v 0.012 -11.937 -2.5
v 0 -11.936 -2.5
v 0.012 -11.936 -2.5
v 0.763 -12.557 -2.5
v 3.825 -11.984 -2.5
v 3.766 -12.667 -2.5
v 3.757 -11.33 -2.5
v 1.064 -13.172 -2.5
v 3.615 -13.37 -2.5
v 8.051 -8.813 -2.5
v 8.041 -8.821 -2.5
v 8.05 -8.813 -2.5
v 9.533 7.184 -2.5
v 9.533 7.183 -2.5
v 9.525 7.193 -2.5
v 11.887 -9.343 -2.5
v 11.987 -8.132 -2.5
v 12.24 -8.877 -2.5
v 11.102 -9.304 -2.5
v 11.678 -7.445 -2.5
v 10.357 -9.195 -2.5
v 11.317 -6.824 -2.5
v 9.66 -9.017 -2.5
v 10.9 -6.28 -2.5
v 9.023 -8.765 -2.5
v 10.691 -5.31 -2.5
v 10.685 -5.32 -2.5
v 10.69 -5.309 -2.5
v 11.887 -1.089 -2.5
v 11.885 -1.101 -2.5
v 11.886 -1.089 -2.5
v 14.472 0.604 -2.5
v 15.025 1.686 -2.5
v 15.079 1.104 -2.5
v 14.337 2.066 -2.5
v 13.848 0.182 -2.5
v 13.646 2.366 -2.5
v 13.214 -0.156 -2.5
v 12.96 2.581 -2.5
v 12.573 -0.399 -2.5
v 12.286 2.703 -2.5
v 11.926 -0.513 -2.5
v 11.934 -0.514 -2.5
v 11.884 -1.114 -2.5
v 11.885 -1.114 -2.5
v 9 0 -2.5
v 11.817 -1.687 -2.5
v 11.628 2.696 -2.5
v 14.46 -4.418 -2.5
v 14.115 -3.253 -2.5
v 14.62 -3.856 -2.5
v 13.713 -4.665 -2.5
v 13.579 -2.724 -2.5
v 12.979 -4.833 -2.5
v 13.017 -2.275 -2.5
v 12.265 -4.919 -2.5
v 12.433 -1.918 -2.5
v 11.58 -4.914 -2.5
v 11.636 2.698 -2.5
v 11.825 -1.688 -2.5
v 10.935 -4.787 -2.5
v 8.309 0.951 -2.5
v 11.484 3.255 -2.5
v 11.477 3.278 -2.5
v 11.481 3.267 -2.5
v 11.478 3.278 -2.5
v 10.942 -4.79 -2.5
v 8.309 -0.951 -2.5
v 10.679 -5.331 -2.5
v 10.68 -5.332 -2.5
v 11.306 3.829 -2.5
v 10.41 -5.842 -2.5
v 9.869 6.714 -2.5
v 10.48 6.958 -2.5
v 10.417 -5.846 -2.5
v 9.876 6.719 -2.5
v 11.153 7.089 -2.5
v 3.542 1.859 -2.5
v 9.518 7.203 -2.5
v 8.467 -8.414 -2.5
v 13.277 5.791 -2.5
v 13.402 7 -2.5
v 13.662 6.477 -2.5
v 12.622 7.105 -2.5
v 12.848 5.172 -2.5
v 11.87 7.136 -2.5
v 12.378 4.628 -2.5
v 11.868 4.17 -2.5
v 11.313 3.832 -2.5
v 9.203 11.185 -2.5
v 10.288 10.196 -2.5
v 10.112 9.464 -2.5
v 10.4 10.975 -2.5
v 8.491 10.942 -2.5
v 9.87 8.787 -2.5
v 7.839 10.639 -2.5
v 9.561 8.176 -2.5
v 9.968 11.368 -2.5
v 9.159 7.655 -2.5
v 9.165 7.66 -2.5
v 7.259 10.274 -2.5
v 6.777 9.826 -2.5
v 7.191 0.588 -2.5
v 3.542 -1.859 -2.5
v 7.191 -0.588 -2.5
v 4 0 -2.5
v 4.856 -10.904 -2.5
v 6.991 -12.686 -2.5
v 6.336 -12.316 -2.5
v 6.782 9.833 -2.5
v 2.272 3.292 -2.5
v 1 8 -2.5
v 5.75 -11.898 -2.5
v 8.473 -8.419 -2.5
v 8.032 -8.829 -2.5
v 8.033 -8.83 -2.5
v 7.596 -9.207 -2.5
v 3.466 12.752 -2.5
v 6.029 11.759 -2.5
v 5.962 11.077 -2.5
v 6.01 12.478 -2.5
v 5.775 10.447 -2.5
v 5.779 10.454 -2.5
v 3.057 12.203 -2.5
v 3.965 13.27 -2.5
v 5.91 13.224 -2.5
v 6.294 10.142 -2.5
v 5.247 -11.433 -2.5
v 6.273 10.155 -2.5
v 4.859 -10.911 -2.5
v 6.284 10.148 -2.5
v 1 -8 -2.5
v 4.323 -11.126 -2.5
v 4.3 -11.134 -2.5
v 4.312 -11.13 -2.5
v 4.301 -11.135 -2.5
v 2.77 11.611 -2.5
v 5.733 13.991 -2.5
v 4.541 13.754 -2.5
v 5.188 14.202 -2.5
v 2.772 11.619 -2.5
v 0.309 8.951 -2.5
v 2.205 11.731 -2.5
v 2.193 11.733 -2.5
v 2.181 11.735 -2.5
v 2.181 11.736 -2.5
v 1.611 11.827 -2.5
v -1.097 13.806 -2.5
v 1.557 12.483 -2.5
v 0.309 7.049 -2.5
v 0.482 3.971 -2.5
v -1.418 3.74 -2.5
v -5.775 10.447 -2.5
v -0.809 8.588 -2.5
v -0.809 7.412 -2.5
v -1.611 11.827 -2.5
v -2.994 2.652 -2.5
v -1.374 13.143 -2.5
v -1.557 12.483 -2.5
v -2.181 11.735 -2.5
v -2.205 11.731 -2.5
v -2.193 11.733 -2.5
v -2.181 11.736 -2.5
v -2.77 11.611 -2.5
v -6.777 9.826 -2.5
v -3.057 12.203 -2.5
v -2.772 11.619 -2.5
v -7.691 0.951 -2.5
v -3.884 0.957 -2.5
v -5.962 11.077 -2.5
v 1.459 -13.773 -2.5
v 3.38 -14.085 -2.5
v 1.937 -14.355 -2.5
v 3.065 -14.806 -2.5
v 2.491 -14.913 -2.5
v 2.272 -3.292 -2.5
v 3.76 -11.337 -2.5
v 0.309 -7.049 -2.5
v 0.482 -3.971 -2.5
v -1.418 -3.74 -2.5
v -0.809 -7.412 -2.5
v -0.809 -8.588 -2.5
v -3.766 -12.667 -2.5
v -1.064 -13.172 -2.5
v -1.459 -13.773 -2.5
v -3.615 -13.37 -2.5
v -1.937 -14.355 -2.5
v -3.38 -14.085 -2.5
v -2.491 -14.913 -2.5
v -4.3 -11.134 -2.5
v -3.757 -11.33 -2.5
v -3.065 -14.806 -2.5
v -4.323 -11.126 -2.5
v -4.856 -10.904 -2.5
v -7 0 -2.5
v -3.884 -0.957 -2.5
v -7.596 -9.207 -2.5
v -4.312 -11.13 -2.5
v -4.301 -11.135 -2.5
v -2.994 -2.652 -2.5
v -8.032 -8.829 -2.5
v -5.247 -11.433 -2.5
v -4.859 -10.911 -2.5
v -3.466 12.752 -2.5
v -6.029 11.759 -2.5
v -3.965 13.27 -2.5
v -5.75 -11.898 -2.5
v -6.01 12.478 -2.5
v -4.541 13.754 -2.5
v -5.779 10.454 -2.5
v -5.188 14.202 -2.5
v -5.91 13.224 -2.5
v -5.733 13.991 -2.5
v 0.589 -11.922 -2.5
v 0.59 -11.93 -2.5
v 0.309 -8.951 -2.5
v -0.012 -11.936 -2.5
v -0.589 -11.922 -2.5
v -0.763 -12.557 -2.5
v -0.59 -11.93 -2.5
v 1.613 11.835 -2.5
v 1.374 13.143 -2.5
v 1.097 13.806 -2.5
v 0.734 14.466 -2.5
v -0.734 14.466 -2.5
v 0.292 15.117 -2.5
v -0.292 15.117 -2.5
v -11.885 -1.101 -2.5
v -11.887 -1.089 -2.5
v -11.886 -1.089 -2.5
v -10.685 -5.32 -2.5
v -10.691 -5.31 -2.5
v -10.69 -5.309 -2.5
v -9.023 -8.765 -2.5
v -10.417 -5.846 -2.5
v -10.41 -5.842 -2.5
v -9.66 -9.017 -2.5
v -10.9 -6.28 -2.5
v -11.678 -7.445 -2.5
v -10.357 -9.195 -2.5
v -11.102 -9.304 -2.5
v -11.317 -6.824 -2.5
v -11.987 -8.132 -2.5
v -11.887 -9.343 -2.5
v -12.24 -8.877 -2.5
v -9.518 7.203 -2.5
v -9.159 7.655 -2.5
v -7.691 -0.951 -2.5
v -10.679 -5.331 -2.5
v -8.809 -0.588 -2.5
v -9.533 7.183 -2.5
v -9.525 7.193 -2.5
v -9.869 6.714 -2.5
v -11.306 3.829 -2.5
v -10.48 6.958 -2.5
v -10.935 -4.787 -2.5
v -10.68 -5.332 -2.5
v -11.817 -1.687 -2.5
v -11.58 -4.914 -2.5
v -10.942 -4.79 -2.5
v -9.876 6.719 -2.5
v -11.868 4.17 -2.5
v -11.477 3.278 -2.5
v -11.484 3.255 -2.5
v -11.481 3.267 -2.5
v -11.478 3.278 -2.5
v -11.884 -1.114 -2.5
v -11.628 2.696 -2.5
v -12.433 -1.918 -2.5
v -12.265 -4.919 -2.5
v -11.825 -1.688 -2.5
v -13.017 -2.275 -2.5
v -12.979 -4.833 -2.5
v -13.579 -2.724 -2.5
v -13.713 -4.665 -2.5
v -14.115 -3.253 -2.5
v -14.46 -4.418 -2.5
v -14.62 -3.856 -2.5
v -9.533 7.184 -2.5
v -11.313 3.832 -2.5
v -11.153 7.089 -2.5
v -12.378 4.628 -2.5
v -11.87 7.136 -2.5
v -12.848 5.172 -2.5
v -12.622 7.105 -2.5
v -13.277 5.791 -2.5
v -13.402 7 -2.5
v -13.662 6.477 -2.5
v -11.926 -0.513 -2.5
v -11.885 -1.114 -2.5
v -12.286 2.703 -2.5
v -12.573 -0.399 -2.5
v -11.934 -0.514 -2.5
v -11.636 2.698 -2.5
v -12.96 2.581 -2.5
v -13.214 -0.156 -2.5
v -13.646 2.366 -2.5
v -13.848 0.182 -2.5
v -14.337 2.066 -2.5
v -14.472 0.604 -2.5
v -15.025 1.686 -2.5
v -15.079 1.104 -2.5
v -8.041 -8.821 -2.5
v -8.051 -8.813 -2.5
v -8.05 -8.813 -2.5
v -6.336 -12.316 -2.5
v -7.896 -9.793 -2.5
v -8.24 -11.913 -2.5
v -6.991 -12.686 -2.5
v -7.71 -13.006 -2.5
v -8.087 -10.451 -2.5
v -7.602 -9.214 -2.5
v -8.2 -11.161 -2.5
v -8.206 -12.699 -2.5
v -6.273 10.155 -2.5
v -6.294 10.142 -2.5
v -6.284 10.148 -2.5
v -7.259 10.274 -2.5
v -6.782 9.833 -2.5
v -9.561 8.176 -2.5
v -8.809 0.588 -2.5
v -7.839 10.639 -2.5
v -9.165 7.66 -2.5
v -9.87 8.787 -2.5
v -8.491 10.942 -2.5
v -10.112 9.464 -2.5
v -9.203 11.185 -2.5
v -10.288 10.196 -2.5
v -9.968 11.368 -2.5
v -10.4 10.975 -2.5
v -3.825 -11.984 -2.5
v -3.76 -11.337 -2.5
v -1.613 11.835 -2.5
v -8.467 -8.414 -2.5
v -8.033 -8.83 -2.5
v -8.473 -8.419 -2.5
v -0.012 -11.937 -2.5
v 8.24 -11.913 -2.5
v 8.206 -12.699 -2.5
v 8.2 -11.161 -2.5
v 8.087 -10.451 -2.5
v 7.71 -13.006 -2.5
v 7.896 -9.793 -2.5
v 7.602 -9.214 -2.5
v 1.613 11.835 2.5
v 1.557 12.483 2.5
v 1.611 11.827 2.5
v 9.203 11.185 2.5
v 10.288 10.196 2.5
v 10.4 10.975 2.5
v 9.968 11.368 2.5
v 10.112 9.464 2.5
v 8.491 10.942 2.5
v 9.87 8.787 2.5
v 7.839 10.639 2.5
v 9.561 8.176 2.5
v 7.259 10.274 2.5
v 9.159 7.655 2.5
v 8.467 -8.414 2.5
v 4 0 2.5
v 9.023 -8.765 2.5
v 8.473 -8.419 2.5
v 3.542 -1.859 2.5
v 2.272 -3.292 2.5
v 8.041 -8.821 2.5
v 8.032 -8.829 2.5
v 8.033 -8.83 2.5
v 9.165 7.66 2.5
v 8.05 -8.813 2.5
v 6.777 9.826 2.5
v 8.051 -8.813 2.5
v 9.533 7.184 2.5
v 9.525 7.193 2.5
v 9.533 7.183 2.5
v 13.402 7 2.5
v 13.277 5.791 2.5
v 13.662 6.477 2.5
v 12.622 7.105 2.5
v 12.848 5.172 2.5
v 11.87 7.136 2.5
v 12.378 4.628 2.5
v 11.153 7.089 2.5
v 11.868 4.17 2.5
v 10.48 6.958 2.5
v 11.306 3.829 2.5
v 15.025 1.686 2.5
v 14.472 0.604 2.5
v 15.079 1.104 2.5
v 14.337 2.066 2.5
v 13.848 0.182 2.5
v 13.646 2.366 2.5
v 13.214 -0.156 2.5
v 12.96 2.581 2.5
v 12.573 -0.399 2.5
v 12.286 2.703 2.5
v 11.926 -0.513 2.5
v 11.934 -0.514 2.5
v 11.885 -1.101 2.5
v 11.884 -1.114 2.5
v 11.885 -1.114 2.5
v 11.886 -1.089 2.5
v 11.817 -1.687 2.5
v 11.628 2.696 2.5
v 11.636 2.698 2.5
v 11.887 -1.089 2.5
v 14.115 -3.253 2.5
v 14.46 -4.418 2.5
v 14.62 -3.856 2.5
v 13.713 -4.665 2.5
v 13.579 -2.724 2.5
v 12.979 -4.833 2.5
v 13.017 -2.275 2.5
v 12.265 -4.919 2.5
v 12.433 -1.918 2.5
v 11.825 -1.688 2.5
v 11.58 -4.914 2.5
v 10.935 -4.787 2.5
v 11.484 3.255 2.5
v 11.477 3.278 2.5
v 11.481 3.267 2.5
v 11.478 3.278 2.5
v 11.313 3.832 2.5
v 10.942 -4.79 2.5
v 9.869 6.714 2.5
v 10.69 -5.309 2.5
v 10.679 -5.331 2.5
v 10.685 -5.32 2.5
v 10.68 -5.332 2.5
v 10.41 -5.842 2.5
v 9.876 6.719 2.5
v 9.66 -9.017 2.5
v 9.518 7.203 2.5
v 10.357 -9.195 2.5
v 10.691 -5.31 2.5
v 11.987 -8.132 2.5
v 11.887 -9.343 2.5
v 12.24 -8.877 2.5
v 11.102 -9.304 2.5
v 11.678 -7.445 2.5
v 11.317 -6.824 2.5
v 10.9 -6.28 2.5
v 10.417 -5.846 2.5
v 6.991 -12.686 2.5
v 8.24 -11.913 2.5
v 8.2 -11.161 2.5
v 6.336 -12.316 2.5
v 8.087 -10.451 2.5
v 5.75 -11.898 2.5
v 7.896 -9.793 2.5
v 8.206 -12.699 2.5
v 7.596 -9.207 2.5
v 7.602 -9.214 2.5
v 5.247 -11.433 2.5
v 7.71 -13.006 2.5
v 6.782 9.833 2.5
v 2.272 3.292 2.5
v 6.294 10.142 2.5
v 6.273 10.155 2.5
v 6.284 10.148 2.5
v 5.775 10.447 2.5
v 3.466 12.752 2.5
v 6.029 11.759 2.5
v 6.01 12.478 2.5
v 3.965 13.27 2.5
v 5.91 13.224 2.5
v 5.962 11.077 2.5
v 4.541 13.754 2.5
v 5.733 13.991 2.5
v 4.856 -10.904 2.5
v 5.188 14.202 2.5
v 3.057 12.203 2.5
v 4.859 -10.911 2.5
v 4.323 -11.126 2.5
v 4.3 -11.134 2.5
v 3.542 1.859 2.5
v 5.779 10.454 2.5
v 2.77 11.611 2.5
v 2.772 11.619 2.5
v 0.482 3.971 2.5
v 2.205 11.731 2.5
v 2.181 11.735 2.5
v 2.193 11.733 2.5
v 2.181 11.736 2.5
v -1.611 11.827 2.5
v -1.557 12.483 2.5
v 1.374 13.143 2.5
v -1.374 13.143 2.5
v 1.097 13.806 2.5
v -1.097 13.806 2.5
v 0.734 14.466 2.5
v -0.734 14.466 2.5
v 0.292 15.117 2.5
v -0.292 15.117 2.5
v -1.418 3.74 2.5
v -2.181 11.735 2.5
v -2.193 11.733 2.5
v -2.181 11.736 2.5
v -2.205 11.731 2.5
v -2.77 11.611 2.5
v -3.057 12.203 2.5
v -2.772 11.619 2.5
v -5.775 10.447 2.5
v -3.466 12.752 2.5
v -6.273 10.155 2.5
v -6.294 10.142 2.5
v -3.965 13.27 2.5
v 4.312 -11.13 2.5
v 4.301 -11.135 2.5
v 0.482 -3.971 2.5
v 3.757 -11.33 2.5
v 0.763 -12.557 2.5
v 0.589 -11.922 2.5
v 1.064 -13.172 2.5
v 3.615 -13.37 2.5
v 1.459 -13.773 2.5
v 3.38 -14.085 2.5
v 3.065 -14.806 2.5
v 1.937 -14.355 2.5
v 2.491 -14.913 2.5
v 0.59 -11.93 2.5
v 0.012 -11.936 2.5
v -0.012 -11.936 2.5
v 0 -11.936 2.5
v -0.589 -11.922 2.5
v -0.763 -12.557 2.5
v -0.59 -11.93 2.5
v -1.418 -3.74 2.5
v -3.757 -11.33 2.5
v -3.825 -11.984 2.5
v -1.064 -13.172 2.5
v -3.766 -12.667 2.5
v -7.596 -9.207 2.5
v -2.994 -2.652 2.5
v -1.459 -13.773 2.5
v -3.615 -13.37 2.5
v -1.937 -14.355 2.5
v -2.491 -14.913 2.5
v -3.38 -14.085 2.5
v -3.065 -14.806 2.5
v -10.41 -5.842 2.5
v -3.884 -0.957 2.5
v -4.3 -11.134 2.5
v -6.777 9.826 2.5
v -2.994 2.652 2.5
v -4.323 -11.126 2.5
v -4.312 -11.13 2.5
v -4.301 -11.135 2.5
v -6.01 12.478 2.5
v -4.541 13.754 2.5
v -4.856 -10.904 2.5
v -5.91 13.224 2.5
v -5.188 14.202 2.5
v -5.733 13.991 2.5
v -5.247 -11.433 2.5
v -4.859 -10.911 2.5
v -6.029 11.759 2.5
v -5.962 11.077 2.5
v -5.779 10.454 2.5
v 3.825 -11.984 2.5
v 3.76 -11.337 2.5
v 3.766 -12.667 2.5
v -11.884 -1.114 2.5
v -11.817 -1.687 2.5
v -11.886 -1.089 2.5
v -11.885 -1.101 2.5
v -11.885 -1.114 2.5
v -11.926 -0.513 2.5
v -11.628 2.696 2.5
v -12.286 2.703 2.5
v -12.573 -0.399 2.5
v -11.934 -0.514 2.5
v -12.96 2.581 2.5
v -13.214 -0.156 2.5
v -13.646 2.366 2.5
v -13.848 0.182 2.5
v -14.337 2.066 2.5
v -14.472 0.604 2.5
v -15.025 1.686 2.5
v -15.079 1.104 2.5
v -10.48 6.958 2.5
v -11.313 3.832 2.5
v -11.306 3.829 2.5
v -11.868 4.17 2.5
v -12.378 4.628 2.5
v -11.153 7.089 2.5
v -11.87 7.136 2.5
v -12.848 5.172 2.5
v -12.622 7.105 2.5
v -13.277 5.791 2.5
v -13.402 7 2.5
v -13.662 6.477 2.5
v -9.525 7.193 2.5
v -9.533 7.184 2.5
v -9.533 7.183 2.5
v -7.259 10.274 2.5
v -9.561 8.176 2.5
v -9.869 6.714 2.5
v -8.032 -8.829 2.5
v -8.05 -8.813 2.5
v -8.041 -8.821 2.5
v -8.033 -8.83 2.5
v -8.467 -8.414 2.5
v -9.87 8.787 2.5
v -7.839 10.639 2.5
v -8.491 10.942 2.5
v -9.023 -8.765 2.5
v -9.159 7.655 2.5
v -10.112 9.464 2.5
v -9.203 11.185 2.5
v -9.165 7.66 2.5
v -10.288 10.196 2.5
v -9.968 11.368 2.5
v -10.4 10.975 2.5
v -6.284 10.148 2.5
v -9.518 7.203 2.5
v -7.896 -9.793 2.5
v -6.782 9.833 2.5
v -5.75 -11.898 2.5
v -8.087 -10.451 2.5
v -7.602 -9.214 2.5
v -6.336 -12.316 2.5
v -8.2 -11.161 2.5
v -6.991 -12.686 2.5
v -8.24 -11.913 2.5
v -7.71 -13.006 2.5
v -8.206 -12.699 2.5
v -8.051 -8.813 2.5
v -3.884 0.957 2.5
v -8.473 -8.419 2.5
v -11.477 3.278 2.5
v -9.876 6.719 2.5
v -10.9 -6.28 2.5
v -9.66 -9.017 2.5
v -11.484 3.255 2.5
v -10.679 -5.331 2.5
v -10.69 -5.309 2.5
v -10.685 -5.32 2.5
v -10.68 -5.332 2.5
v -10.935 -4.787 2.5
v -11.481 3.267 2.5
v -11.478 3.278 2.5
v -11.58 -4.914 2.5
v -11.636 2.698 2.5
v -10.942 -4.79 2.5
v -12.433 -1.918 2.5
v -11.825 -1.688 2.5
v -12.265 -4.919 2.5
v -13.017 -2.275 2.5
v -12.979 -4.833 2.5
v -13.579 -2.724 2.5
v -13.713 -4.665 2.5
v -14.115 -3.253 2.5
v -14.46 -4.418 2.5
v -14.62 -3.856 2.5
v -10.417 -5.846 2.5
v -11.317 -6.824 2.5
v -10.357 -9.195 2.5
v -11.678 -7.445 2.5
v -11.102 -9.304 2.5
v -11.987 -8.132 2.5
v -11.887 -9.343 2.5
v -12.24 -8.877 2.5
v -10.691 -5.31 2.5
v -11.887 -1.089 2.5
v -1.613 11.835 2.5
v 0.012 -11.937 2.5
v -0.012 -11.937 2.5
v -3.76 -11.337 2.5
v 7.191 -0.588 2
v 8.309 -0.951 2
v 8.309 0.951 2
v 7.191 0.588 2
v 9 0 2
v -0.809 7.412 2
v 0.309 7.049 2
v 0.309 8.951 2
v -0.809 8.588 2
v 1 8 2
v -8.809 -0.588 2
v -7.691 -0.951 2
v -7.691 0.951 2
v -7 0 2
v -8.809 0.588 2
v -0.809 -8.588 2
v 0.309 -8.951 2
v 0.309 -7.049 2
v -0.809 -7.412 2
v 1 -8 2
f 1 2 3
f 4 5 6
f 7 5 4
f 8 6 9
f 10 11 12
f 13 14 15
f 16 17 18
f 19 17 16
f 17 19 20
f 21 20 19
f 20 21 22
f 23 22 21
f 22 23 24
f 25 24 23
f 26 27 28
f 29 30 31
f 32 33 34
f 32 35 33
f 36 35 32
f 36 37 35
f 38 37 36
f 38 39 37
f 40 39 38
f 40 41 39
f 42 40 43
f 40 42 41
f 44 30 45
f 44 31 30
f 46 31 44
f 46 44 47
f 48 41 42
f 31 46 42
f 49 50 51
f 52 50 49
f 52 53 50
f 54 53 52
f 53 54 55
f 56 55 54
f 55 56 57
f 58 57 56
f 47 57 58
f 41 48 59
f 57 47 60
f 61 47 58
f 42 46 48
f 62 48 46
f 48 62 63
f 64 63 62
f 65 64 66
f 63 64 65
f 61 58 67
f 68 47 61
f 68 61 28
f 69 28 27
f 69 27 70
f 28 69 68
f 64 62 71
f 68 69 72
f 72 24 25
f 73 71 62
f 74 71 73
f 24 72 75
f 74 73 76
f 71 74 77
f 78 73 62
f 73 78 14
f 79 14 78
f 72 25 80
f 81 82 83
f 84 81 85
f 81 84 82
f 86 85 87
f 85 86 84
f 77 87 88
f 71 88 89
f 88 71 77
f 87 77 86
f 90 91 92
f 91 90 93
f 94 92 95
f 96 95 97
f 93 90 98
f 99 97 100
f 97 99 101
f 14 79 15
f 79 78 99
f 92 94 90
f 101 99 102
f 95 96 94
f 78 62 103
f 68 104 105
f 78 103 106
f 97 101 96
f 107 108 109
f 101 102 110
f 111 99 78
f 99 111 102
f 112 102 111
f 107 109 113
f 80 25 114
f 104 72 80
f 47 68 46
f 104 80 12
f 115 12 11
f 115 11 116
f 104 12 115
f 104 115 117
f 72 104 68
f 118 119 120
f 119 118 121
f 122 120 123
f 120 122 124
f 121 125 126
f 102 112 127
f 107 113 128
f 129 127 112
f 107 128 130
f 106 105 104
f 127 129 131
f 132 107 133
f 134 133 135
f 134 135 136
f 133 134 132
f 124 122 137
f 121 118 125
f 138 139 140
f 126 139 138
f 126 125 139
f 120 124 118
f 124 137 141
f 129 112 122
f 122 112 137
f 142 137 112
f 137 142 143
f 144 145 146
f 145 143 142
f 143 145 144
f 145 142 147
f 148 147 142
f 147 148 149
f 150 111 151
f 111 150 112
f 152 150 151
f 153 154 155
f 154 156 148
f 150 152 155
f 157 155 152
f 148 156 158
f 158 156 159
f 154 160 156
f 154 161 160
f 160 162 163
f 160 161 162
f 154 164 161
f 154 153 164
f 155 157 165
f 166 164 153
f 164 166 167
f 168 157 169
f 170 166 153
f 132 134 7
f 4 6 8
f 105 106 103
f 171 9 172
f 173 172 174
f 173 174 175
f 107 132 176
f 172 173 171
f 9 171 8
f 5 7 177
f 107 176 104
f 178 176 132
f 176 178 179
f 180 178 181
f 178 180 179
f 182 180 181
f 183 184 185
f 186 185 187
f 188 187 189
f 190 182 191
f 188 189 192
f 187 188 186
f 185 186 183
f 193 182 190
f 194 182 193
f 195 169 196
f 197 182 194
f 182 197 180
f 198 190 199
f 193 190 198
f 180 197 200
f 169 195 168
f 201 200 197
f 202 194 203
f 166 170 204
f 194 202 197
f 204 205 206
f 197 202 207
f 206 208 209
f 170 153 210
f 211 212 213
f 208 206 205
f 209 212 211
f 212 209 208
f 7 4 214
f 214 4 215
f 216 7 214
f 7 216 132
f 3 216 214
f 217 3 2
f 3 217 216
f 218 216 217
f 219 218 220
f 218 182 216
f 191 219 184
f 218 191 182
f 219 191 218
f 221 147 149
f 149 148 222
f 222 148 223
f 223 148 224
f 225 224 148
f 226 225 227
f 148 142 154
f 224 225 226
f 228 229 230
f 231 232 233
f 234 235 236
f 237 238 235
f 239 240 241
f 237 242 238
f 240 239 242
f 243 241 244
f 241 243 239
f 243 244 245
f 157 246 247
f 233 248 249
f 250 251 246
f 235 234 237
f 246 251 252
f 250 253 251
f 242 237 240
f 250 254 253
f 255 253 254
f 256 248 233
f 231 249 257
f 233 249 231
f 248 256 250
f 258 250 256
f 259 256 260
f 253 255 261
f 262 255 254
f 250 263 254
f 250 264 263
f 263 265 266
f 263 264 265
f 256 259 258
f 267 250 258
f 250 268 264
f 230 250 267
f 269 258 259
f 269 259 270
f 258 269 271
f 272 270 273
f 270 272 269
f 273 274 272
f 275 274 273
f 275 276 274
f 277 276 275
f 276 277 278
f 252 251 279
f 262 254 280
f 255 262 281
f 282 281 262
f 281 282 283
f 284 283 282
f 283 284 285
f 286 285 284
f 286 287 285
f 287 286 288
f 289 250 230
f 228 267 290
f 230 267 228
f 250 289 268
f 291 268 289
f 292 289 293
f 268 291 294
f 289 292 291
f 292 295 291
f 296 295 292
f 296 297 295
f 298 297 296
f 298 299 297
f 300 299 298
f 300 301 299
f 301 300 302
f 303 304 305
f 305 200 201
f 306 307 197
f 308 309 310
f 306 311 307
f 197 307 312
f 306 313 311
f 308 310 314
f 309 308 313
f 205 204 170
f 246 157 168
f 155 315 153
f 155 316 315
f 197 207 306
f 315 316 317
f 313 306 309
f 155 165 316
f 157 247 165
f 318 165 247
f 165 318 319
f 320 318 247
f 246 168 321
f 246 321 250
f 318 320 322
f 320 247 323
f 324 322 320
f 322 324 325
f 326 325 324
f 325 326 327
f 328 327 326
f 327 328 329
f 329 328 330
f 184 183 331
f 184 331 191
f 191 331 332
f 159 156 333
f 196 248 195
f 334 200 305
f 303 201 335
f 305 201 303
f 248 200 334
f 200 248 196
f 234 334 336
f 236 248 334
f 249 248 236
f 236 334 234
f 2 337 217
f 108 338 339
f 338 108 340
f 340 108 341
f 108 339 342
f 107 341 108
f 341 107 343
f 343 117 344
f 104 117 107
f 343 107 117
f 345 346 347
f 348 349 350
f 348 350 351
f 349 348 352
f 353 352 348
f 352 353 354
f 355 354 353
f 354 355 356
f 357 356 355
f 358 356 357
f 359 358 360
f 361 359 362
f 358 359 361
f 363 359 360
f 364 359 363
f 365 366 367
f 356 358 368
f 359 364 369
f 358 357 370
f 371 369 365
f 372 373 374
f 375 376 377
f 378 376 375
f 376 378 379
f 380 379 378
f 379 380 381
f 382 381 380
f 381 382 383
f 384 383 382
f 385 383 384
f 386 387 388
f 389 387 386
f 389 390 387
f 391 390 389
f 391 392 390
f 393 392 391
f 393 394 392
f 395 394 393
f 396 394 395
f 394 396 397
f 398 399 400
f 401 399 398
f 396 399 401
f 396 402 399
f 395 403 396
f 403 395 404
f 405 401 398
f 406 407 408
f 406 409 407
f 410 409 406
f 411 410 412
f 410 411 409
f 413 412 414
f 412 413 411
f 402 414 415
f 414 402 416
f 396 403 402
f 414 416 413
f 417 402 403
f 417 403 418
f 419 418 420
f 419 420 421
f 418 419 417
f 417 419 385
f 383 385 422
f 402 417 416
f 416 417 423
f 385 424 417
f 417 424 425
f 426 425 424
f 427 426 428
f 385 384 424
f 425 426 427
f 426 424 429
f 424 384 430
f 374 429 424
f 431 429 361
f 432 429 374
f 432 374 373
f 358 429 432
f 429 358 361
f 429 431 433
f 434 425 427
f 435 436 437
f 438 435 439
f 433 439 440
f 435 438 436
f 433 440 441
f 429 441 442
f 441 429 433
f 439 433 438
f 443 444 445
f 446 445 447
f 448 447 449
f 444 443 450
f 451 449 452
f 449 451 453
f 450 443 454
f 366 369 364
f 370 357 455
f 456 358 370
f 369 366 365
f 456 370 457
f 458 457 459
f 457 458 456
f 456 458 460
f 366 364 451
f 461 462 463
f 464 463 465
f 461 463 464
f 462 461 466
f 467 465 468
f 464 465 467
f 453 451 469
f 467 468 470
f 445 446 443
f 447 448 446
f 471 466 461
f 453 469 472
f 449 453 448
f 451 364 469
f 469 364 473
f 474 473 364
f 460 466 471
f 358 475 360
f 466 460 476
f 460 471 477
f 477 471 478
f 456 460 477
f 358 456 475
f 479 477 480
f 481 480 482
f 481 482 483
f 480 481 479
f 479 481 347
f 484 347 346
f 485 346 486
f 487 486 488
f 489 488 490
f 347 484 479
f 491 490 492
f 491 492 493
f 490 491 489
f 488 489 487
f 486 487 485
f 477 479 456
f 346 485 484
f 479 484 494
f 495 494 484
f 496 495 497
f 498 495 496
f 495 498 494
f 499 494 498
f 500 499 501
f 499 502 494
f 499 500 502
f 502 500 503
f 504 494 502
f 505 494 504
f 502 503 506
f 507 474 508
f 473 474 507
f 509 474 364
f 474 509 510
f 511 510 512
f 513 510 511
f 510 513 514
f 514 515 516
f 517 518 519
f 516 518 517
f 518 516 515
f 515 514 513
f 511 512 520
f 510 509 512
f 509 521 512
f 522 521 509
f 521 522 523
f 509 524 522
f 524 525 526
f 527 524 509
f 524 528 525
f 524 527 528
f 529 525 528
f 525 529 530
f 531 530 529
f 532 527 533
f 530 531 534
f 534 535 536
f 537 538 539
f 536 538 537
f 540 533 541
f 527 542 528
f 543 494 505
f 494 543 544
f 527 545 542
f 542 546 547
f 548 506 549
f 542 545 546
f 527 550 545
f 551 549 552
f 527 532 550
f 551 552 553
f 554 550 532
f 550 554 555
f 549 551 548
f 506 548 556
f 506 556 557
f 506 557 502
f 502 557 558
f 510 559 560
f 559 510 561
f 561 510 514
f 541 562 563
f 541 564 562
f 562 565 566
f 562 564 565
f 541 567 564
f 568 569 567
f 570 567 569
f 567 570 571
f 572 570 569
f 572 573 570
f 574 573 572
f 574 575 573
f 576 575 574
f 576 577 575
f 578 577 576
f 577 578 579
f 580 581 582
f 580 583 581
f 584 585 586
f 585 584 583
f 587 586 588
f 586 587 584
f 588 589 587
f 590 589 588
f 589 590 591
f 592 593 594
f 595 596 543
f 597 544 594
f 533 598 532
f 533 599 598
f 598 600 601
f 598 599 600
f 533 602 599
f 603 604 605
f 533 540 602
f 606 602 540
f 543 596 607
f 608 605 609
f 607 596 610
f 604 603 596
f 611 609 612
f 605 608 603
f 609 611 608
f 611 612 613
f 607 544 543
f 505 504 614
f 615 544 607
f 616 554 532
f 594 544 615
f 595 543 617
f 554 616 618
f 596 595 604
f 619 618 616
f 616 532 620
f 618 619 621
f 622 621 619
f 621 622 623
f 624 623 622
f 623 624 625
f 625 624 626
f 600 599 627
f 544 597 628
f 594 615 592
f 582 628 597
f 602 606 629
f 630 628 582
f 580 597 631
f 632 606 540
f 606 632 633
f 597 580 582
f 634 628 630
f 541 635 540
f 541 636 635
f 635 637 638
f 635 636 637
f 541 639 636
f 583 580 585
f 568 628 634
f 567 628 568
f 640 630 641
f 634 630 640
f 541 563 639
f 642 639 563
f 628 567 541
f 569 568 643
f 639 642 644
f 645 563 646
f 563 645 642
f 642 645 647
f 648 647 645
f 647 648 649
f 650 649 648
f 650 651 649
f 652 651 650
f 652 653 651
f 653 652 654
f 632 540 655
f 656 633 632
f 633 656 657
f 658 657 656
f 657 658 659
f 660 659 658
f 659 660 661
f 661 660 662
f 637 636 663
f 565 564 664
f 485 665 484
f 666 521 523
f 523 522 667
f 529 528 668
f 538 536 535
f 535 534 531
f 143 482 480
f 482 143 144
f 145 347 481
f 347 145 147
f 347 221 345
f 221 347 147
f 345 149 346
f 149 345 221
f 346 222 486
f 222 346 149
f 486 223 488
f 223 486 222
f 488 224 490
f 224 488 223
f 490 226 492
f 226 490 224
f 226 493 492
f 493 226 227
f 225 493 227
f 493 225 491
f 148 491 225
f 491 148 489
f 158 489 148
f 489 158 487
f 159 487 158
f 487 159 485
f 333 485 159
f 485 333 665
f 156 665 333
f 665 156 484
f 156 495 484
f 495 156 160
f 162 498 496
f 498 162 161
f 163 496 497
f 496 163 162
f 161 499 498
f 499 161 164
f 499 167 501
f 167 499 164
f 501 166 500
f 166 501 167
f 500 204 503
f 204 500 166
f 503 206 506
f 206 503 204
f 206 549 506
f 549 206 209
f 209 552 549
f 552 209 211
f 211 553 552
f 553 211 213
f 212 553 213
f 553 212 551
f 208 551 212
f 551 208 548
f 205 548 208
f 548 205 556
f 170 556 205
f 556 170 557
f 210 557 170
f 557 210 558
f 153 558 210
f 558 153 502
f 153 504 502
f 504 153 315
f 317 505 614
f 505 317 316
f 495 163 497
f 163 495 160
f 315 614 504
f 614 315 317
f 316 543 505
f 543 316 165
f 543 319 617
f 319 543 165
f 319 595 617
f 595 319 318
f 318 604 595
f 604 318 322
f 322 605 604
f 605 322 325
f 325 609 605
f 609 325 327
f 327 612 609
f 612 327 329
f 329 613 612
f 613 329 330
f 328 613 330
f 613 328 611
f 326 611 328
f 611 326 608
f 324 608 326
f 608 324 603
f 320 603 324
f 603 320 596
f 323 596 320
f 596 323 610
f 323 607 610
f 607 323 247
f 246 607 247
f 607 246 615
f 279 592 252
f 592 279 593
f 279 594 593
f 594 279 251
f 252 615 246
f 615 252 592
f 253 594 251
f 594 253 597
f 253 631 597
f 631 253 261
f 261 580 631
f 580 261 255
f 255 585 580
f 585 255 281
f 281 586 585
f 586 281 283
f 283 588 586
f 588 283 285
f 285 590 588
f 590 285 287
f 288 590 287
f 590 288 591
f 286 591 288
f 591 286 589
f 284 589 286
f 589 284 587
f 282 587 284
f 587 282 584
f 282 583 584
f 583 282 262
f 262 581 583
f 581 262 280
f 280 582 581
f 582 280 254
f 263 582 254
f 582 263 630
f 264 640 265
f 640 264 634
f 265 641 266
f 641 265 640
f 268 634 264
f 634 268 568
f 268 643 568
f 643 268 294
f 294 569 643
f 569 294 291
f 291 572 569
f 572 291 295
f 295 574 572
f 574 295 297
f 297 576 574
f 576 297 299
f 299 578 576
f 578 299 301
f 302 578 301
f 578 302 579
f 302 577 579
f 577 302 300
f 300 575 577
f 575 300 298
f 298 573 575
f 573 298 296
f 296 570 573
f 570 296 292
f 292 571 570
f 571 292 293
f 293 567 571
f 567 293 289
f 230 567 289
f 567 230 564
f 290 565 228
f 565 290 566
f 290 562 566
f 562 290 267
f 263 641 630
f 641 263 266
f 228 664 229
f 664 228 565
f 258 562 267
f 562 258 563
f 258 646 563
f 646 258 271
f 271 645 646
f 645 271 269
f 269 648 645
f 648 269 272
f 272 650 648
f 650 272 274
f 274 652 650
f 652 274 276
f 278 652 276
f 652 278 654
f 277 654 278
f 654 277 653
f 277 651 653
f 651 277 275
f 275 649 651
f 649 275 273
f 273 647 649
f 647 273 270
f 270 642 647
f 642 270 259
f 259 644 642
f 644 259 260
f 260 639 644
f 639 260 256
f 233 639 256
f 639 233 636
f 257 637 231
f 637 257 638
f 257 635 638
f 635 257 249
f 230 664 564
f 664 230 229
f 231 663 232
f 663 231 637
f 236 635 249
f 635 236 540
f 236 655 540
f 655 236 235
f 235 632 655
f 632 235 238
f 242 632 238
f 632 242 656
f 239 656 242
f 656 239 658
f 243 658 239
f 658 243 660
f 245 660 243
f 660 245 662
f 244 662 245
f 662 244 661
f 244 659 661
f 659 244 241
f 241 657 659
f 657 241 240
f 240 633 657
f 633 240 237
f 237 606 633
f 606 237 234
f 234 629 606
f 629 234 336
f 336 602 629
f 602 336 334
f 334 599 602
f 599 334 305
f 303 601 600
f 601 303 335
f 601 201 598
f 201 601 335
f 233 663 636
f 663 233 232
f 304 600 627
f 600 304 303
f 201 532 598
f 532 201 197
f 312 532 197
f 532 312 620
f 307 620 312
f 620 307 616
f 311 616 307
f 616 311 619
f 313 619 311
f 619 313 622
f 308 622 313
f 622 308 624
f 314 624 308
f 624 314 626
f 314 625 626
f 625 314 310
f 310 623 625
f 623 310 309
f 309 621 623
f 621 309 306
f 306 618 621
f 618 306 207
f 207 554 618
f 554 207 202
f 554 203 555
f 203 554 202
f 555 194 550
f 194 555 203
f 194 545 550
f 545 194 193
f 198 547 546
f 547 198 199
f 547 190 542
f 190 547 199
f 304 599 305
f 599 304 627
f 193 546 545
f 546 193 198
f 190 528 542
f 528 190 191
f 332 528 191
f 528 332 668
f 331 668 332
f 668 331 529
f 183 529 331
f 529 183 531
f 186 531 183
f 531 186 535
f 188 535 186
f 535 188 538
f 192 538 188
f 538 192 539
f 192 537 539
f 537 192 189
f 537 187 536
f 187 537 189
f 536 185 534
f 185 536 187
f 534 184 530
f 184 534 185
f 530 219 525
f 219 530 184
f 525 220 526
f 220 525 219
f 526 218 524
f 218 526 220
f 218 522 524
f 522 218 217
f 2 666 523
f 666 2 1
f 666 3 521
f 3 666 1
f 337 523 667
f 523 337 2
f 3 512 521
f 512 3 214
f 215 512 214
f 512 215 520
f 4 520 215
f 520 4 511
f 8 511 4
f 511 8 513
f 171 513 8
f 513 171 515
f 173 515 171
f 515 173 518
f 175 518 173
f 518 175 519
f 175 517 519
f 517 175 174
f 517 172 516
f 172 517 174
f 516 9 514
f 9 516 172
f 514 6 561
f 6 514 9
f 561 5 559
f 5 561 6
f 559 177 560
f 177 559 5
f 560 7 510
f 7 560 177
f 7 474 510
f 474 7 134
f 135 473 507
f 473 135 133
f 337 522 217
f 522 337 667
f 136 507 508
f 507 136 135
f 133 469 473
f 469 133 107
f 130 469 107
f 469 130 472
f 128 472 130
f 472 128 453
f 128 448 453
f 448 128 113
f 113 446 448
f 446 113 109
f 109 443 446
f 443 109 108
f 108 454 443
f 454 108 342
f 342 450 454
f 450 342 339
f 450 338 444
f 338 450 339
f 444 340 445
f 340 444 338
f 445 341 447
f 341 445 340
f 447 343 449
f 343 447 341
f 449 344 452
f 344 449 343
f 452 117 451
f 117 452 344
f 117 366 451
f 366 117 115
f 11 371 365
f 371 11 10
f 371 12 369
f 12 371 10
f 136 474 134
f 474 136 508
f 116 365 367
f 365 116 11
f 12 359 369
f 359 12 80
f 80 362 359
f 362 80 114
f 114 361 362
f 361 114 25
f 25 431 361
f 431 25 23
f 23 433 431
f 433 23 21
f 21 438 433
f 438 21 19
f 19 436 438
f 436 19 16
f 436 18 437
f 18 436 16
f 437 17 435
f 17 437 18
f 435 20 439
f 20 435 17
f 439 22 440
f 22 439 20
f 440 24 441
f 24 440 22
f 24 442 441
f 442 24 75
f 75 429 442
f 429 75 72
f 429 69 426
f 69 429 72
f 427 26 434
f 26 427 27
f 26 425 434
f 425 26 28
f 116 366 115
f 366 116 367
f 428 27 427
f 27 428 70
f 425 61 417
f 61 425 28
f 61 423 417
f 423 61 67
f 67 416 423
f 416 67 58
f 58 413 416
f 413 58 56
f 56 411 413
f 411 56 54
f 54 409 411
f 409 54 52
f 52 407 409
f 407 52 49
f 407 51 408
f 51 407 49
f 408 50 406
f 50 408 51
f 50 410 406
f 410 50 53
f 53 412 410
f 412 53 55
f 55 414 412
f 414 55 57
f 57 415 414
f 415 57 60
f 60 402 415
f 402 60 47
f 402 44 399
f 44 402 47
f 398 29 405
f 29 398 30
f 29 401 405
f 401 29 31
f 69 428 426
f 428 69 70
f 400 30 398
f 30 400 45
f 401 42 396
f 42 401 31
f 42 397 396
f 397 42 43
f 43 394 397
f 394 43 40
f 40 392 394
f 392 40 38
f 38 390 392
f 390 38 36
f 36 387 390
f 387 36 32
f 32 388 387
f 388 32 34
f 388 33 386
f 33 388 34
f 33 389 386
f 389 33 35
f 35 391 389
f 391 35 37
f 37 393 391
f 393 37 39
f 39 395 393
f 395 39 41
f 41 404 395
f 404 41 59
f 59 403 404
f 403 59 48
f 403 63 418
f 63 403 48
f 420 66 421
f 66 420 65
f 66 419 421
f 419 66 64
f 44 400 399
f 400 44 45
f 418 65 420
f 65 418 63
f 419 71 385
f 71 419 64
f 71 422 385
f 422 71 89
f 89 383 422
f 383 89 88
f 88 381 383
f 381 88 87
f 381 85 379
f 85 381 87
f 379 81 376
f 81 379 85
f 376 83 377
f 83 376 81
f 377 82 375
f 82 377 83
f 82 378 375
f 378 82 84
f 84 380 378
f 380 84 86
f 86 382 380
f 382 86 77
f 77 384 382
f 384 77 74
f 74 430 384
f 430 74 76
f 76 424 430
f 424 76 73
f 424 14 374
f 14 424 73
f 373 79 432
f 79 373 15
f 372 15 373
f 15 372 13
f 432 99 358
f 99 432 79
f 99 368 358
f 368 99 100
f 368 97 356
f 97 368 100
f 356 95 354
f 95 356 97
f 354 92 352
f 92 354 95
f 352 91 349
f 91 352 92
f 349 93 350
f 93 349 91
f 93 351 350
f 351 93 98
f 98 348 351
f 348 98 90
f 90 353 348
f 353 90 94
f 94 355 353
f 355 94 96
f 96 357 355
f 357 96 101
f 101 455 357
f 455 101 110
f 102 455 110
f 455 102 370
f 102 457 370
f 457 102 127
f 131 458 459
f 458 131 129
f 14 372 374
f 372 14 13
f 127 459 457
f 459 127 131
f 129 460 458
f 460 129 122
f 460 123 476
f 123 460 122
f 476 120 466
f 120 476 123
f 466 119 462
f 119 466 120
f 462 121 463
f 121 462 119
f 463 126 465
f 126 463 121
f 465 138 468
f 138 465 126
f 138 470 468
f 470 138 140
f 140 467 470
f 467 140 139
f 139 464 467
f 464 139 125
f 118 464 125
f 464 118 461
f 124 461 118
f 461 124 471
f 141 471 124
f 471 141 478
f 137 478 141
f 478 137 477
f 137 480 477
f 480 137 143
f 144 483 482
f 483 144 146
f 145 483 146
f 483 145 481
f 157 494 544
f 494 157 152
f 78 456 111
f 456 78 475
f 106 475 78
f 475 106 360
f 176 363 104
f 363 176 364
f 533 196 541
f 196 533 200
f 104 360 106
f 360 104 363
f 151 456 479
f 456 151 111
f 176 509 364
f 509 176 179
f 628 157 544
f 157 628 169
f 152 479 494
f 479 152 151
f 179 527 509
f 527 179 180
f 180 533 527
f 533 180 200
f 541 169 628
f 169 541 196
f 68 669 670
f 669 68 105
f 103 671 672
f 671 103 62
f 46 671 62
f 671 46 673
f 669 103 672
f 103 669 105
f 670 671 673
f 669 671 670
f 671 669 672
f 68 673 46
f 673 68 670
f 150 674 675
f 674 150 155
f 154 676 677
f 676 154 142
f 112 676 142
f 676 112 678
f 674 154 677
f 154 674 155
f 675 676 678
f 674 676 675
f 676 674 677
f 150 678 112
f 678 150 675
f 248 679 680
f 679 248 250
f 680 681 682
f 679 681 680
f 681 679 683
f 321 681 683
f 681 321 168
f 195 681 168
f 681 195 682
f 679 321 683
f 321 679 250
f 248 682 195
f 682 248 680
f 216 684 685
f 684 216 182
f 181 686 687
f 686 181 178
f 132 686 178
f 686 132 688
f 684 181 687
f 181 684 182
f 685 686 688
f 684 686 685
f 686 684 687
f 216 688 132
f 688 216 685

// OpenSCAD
// file: ruler.scad
module ruler(length)
{
    mark_width = 0.125;
    mark_depth = 0.05;

    difference()
    {
        cube( [1, length, 8 ] );
        for ( i = [1:length-1] )
        {
            translate( [mark_depth, i, 0] ) cube( [1, mark_width, 3 ] );
            translate( [-mark_depth, i, 0] ) cube( [1, mark_width, 3 ] );
            if (i % 5 == 0)
            {
                translate( [mark_depth, i, 0] ) cube( [5, mark_width, 5 ] );
                translate( [-mark_depth, i, 0] ) cube( [5, mark_width, 5 ] );
            }
            if (i % 10 == 0)
            {
                translate( [mark_depth, i, 0] ) cube( [10, mark_width, 7 ] );
                translate( [-mark_depth, i, 0] ) cube( [10, mark_width, 7 ] );
            }
        }
    }
}
// main file
include <gear.scad>            
include <ruler.scad>

n1           = 17; // number of teeth
mm_per_tooth = 5; 
thickness    = 5;
hole         = 0;

// translate([ 0, -15, 3]) ruler(200);

union(){
    difference(){
        color([1.00,1.00,1.00])
        gear(mm_per_tooth,n1,thickness,hole);

        color([1.00,1.00,1.00])
        cylinder(thickness + 1, 4, 4, center=true);
        
        color([1.00,1.00,1.00])
        translate([8, 0, -1 * thickness +2/ 2])
        cylinder(thickness + 1, 1, 1);
        
        color([1.00,1.00,1.00])
        translate([0, 8, -1 * thickness +2/ 2])
        cylinder(thickness + 1, 1, 1);
        
        color([1.00,1.00,1.00])
        translate([-8, 0, -1 * thickness + 2/ 2])
        cylinder(thickness + 1, 1, 1);
        
        color([1.00,1.00,1.00])
        translate([0, -8, -1 * thickness + 2 / 2])
        cylinder(thickness + 1, 1, 1);
    }
}
